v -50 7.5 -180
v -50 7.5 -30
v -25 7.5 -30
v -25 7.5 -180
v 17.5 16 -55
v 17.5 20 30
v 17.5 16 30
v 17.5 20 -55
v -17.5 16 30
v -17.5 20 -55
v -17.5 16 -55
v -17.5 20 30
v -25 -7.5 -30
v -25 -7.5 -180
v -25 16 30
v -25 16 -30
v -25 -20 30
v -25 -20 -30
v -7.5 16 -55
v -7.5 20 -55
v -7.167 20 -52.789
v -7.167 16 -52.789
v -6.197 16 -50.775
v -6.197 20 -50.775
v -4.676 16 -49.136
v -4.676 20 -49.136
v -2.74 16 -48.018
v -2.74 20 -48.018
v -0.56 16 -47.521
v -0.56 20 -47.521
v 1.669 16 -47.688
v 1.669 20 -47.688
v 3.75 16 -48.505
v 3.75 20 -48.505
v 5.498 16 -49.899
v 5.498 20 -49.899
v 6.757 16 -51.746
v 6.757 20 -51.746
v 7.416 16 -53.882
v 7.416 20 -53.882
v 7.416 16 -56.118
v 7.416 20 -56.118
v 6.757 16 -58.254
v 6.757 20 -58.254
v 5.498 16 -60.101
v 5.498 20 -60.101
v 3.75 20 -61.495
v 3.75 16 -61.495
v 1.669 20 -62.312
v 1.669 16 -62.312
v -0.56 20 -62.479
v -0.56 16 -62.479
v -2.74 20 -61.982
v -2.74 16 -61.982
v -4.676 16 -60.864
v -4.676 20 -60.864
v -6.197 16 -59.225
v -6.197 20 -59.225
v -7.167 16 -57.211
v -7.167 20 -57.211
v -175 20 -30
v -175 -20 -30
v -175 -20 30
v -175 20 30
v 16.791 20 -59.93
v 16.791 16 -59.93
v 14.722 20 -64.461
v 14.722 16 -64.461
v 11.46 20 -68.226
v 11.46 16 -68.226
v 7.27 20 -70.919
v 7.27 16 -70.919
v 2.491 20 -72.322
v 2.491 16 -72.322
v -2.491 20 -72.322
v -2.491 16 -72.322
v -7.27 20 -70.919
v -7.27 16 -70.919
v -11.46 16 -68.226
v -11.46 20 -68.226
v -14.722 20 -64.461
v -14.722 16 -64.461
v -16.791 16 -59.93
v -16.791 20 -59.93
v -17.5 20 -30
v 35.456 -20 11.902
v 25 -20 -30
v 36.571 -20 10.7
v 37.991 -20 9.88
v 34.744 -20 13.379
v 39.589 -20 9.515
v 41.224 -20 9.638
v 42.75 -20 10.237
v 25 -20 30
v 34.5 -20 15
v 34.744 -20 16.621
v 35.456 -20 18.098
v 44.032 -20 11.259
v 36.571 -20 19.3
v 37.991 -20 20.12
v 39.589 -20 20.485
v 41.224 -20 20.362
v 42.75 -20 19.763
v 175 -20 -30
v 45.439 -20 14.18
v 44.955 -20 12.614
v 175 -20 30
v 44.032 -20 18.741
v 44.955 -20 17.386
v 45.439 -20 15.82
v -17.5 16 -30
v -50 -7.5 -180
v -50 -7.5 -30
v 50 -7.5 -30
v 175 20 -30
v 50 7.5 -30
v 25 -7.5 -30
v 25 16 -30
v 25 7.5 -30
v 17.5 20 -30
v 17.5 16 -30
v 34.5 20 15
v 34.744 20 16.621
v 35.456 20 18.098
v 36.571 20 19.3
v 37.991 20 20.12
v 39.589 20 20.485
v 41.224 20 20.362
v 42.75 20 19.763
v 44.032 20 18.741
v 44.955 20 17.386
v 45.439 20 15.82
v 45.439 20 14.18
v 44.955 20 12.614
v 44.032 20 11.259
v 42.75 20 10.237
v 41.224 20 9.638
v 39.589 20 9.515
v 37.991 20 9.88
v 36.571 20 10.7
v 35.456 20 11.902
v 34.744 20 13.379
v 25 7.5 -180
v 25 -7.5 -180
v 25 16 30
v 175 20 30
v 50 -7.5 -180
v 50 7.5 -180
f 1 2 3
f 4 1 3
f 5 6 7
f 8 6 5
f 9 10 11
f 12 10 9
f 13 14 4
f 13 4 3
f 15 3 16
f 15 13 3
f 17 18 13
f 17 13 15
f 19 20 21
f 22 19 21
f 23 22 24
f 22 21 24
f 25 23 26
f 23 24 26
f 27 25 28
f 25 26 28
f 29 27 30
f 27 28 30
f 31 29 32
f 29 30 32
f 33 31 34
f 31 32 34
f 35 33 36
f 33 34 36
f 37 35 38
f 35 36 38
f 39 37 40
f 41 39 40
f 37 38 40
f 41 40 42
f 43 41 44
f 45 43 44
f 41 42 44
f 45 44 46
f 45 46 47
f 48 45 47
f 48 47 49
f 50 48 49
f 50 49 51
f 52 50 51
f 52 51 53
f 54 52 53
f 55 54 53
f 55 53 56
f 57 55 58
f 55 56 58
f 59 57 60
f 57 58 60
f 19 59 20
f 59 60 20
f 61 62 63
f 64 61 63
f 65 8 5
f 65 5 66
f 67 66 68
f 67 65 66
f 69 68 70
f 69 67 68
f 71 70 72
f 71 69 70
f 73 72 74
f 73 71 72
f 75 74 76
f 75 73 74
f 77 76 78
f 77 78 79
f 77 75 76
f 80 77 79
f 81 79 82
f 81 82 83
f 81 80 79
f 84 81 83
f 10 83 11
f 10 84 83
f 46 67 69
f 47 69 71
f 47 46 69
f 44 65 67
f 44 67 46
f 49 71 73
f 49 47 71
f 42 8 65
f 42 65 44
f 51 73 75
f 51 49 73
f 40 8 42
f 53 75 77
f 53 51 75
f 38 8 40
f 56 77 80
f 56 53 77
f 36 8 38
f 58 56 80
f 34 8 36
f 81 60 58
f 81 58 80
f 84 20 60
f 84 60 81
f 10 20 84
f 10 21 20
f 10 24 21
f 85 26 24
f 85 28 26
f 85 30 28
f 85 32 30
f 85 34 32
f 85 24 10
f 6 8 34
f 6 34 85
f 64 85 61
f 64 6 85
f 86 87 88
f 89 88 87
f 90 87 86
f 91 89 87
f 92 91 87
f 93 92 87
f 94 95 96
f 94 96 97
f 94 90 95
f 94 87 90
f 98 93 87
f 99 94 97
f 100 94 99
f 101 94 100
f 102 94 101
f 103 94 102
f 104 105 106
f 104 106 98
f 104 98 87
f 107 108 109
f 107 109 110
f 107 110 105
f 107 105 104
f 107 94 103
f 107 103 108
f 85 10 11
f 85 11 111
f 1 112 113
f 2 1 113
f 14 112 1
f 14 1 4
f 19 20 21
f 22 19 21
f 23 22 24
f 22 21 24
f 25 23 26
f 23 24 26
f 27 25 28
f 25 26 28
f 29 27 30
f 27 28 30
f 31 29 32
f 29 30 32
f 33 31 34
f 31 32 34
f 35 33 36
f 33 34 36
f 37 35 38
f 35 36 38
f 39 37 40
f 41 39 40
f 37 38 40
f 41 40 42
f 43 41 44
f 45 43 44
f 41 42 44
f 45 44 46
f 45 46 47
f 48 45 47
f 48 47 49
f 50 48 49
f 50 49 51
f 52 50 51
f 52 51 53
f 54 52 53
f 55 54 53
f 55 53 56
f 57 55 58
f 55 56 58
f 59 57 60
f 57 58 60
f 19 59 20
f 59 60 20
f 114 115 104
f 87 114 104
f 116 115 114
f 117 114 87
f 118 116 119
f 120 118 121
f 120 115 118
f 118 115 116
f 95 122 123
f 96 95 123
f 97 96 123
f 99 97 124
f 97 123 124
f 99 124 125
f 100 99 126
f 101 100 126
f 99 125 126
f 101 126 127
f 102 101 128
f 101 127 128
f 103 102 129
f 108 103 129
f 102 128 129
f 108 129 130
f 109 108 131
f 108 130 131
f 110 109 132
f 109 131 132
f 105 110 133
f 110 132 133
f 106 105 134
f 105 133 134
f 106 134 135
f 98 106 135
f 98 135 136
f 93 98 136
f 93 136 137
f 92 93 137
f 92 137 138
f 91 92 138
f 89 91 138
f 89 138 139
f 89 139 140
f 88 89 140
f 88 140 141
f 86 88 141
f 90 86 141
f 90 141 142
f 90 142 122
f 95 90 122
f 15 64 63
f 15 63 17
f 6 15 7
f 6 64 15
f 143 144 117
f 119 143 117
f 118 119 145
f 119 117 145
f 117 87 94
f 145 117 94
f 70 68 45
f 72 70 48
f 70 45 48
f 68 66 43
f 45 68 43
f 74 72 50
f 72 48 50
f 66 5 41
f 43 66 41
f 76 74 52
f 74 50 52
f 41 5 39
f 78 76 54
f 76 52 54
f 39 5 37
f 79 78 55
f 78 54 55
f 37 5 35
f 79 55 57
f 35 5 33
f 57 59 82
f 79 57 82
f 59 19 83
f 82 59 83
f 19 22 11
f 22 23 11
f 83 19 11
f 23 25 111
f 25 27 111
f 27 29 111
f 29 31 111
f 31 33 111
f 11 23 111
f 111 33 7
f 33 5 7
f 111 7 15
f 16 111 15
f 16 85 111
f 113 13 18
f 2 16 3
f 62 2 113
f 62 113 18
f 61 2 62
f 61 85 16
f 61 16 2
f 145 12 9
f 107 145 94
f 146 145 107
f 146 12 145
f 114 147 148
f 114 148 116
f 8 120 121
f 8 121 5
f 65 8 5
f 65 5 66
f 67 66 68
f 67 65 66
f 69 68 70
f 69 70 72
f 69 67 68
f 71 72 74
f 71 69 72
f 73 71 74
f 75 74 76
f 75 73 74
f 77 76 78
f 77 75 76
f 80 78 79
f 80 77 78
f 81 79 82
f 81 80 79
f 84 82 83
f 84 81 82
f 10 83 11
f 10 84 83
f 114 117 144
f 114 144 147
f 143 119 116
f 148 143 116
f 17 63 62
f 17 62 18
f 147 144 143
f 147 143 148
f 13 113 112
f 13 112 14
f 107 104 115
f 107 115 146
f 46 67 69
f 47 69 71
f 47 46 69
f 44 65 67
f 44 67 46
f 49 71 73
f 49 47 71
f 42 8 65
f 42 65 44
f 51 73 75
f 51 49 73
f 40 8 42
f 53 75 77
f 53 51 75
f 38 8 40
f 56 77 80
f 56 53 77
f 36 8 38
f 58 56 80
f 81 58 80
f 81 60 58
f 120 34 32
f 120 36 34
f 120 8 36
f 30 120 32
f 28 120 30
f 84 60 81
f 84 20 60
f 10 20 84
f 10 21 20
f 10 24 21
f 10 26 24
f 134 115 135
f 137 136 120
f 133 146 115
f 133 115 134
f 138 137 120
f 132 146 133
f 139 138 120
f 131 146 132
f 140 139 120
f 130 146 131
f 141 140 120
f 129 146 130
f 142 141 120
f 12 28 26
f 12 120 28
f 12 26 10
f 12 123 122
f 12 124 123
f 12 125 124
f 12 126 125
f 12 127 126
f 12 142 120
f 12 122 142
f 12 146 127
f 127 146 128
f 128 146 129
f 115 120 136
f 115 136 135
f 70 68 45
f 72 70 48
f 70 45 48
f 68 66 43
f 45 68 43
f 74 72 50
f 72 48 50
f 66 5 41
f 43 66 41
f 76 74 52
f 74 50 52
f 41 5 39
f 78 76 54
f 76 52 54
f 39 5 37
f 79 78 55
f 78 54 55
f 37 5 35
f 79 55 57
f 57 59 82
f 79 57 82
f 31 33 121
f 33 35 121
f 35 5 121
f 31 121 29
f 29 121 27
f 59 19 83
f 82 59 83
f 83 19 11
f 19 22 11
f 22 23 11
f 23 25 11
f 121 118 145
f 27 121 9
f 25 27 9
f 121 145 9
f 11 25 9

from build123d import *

# Parameters (mm, degrees)
F0_W     = 150
F0_H     = 60
F1_DEPTH = 20
F2_W     = 25
F2_H     = 150
F3_DEPTH = 7.5
F4_R     = 7.5
F5_DEPTH = 4
F6_R     = 5.5
F7_DEPTH = 40.001
F8_R     = 7.5
F9_DEPTH = 4


with BuildPart() as f1:
    # F0 (on Front) → F1 (new body, symmetric)
    with BuildSketch(Plane.XZ):
        with Locations((100, 0)):
            Rectangle(F0_W, F0_H)
    extrude(amount=F1_DEPTH, both=True)

    # F2 (on Front) → F3, piece 2 (join, symmetric)
    with BuildSketch(Plane.XZ):
        with Locations((37.5, -105)):
            Rectangle(F2_W, F2_H)
    extrude(amount=F3_DEPTH, both=True)

    # F6 (on face) → F7 (cut, through all)
    with BuildSketch(Plane(origin=(0, 20, 0), x_dir=(-1, 0, 0), z_dir=(0, 1, 0))):
        with Locations((-40, 15)):
            Circle(F6_R)
    extrude(amount=-F7_DEPTH, mode=Mode.SUBTRACT)

    # F8 (on face) → F9 (join)
    with BuildSketch(Plane(origin=(0, 20, 0), x_dir=(-1, 0, 0), z_dir=(0, 1, 0))):
        with BuildLine():
            Line((-17.5, 30), (-25, 30))
            Line((-25, 30), (-25, -30))
            Line((-25, -30), (-17.5, -30))
            Line((-17.5, -30), (-17.5, -55))
            ThreePointArc((-17.5, -55), (0, -37.5), (17.5, -55))
            Line((17.5, -55), (17.5, 30))
            Line((17.5, 30), (-17.5, 30))
        make_face()
        with BuildLine():
            ThreePointArc((-17.5, -55), (0, -72.5), (17.5, -55))
            ThreePointArc((17.5, -55), (0, -37.5), (-17.5, -55))
        make_face()
        with Locations((0, -55)):
            Circle(F8_R, mode=Mode.SUBTRACT)
    extrude(amount=-F9_DEPTH)


with BuildPart() as f1b:
    # F0 (on Front) → F1, piece 2 (new body, symmetric)
    with BuildSketch(Plane.XZ):
        with Locations((-100, 0)):
            Rectangle(F0_W, F0_H)
    extrude(amount=F1_DEPTH, both=True)

    # F2 (on Front) → F3 (join, symmetric)
    with BuildSketch(Plane.XZ):
        with Locations((-37.5, -105)):
            Rectangle(F2_W, F2_H)
    extrude(amount=F3_DEPTH, both=True)

    # F4 (on face) → F5 (join)
    with BuildSketch(Plane(origin=(0, 20, 0), x_dir=(-1, 0, 0), z_dir=(0, 1, 0))):
        with BuildLine():
            Line((25, 30), (17.5, 30))
            Line((17.5, 30), (-17.5, 30))
            Line((-17.5, 30), (-17.5, -55))
            ThreePointArc((-17.5, -55), (0, -37.5), (17.5, -55))
            Line((17.5, -55), (17.5, -30))
            Line((17.5, -30), (25, -30))
            Line((25, -30), (25, 30))
        make_face()
        with BuildLine():
            ThreePointArc((17.5, -55), (0, -37.5), (-17.5, -55))
            ThreePointArc((-17.5, -55), (0, -72.5), (17.5, -55))
        make_face()
        with Locations((0, -55)):
            Circle(F4_R, mode=Mode.SUBTRACT)
    extrude(amount=-F5_DEPTH)


solid = Compound([f1.part, f1b.part])
